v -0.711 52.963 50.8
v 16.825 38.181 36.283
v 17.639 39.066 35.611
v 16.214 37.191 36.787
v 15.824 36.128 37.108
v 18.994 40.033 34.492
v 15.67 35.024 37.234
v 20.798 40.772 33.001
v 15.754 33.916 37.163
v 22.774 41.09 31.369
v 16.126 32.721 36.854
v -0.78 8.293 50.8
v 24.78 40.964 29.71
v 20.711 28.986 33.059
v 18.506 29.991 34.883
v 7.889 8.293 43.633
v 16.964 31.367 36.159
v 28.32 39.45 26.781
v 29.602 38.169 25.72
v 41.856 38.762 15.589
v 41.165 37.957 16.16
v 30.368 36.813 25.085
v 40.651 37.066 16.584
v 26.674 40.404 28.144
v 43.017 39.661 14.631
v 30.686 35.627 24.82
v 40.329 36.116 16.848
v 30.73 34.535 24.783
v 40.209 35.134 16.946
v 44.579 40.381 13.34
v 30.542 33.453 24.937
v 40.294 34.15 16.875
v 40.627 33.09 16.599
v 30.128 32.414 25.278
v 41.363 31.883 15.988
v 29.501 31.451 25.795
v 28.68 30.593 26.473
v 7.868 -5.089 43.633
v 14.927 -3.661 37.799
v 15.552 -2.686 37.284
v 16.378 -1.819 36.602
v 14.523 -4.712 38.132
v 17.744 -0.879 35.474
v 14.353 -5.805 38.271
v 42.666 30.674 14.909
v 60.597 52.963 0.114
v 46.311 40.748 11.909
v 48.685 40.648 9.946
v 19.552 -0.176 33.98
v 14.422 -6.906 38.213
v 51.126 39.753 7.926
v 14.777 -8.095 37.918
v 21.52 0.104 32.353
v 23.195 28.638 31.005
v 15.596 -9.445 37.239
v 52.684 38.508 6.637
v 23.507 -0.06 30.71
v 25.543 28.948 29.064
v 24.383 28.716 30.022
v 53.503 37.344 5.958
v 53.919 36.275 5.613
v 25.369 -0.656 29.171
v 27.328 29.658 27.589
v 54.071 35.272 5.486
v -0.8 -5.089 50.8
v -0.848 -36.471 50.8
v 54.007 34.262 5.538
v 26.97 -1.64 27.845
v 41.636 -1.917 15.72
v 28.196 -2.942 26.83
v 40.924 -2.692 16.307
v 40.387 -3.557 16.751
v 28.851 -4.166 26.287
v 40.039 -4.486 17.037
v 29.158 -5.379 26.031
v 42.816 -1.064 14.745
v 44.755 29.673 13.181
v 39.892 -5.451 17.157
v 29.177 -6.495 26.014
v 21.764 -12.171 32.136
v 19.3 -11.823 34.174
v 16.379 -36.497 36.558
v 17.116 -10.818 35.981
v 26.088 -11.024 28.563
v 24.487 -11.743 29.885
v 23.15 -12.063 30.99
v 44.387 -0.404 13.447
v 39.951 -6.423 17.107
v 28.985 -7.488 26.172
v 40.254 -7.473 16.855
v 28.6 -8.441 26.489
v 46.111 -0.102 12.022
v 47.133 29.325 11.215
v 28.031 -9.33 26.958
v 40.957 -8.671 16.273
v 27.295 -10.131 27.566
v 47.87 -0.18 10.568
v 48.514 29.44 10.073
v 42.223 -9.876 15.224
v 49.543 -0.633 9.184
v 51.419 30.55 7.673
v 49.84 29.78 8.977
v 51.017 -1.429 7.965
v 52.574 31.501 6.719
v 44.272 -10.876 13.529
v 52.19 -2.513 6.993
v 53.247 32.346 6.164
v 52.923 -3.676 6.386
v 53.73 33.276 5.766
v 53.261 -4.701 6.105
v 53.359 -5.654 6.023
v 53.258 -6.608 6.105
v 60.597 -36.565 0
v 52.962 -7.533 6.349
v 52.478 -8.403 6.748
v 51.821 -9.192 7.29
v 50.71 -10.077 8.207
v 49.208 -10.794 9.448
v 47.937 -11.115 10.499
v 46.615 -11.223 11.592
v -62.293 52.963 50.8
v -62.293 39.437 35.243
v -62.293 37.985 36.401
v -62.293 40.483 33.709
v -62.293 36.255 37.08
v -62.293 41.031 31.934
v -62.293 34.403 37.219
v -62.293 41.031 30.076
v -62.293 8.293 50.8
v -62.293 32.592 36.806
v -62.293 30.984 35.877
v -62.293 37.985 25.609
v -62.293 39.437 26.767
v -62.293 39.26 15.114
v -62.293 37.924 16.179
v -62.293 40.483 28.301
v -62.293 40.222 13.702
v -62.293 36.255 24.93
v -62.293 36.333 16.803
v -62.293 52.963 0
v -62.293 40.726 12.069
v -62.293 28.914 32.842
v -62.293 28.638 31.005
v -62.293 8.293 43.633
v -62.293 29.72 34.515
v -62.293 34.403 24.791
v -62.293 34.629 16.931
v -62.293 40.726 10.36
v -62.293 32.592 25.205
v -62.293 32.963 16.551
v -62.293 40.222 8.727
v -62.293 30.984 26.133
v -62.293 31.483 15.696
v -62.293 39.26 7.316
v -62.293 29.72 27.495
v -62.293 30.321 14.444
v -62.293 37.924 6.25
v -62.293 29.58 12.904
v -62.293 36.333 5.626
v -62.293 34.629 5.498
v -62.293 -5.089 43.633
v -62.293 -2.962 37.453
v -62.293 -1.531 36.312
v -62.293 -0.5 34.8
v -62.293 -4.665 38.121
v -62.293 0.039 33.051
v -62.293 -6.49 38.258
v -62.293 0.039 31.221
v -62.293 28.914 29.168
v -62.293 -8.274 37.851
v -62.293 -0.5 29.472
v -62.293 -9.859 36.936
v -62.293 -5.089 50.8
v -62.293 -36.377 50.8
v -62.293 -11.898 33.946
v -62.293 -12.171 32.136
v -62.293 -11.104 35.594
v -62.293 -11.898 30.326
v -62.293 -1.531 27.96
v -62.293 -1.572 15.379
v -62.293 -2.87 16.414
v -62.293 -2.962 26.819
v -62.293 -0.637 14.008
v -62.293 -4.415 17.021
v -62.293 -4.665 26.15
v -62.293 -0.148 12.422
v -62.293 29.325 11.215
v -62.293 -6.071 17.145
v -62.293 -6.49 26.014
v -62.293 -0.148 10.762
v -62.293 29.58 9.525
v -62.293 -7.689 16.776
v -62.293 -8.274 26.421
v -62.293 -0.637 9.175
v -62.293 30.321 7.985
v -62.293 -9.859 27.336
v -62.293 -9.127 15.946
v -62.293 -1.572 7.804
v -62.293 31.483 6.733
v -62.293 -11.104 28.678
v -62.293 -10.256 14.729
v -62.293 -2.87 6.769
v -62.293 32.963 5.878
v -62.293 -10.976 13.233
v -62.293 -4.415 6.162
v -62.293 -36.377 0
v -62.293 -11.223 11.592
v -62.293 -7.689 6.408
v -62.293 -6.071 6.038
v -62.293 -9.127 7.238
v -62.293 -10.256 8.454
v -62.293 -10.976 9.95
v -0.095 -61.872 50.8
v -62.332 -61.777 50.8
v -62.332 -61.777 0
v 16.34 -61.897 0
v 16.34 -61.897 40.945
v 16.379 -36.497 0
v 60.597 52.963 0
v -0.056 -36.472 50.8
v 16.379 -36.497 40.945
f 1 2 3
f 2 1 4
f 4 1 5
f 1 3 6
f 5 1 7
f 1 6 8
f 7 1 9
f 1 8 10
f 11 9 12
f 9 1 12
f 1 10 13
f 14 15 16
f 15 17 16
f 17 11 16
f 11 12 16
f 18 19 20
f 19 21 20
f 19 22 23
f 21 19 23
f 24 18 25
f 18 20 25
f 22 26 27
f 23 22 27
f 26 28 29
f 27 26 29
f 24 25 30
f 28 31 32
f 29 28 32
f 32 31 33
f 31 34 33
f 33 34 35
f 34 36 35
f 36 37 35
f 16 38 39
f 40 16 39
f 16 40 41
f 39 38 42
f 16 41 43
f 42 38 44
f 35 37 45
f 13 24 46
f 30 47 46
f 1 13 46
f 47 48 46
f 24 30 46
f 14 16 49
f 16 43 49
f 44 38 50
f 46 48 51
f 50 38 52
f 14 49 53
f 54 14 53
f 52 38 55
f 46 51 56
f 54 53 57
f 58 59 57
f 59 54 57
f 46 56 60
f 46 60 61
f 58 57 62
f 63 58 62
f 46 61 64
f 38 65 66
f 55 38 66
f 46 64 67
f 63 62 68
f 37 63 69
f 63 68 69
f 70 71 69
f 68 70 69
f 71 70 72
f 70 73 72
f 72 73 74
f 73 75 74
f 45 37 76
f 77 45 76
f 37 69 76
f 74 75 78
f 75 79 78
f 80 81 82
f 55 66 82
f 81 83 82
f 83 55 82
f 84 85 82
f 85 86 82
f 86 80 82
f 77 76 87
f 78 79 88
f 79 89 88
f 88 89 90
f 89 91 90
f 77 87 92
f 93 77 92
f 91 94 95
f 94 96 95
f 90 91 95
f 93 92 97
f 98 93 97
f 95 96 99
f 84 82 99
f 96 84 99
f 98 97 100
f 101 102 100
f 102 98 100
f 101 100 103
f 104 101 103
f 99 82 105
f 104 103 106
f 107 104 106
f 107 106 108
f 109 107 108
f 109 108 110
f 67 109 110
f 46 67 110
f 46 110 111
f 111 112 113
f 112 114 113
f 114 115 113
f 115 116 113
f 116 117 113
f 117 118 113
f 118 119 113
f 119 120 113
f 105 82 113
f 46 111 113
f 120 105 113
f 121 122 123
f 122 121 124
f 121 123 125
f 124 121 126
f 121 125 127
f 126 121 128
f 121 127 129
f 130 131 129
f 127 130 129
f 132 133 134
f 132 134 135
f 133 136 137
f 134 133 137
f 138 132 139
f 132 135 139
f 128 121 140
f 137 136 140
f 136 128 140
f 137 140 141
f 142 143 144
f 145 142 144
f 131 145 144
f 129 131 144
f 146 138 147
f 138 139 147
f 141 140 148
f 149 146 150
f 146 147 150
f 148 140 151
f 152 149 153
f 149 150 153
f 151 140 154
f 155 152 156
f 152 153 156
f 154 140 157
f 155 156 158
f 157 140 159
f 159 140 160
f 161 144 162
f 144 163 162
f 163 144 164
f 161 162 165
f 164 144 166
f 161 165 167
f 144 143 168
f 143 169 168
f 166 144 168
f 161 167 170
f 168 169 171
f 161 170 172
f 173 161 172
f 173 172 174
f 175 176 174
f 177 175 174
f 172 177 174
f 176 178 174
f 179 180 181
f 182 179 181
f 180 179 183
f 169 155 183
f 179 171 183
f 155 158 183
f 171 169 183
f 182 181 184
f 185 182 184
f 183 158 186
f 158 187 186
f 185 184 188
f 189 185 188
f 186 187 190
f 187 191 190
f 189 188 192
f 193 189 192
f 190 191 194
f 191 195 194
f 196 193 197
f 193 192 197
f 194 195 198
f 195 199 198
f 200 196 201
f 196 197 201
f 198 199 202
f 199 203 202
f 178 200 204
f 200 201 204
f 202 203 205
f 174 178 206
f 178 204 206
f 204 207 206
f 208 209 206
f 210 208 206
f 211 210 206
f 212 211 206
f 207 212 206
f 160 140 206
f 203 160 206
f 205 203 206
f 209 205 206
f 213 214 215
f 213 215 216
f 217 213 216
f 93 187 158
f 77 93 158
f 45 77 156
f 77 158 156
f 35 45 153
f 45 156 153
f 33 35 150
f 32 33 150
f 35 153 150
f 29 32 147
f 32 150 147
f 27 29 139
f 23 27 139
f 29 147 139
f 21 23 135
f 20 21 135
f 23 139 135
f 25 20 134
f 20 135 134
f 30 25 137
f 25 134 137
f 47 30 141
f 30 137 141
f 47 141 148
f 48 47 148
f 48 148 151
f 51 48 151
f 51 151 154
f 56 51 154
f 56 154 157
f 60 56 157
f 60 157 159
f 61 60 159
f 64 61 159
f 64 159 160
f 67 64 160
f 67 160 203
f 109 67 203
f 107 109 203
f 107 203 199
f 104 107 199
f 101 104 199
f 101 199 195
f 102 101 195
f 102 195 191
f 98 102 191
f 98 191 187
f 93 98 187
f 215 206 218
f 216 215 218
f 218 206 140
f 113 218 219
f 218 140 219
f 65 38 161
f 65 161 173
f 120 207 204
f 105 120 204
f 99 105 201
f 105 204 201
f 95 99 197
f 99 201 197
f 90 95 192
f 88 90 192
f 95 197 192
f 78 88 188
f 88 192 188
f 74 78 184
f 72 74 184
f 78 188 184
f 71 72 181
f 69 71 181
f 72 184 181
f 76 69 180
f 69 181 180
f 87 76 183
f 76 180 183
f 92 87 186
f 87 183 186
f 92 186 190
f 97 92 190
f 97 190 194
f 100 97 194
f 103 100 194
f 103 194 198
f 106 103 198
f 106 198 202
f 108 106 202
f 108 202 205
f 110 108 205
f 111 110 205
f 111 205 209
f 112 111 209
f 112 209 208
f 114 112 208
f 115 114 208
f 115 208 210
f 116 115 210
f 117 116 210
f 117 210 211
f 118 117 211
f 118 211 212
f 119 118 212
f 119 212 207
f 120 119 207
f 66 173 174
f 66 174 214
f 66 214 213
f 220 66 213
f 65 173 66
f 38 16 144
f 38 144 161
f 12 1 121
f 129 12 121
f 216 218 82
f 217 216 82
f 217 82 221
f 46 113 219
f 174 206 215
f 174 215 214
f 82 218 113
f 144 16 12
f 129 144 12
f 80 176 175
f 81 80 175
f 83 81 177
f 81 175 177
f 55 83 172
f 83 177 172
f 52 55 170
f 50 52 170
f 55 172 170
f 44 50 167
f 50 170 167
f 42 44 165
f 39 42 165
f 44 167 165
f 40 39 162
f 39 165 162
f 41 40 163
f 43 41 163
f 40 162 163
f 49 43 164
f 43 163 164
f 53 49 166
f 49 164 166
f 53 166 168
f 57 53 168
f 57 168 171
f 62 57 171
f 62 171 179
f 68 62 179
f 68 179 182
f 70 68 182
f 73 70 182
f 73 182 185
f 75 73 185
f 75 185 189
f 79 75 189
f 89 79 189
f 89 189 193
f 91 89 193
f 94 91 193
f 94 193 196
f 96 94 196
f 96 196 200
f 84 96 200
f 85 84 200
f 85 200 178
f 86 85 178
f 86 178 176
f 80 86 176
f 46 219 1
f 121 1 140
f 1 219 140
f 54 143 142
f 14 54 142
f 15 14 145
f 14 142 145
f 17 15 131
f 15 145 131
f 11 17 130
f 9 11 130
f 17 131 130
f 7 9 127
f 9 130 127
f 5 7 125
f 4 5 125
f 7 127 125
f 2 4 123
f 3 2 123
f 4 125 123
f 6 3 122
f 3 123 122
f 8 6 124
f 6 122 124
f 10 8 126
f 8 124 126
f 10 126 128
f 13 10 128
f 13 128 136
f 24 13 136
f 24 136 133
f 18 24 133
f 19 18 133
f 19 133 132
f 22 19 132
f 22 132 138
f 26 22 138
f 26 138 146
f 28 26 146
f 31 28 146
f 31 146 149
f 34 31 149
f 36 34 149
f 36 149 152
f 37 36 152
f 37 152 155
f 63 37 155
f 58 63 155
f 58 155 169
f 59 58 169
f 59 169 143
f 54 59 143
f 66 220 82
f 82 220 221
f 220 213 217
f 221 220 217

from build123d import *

# Parameters (mm, degrees)
F1_DEPTH  = 50.8
F3_DEPTH  = 0.189480841
F4_DEPTH  = 89.7186418795
F5_W      = 13.382118661
F5_H      = 7.166751343
F6_DEPTH  = 122.8903324733
F7_W      = 78.6715284359
F7_H      = 50.8
F8_DEPTH  = 25.4
F10_DEPTH = 25.4
F11_R     = 6.2312707334
F12_DEPTH = 122.8903324733
F13_R     = 6.1393781486
F14_DEPTH = 122.8903324733
F15_R     = 5.7324119576
F16_DEPTH = 122.8903324733
F17_R     = 5.5689542342
F18_DEPTH = 122.8903324733


with BuildPart() as f1:
    # F0 (on Top) → F1 (new body)
    with BuildSketch(Plane.XY):
        Polygon((-62.2928291559, 52.9630370438), (-62.2928291559, -36.376748234), (60.5965033174, -36.5652292967), (60.5965033174, 52.9630370438), align=None)
    extrude(amount=F1_DEPTH)

    # F2 (on face) → F3 (join, through all)
    with BuildSketch(Plane(origin=(-0.0559391088, -36.4722038357, 0), x_dir=(0.9999988238, -0.0015337445, 0), z_dir=(-0.0015337445, -0.9999988238, 0))):
        Polygon((60.6525137648, 50.8), (-0.7922247423, 50.8), (60.6525137648, 0), align=None)
    extrude(amount=F3_DEPTH)

    # F4 (cut, through all): a face of the model
    f4_faces = [f1.faces().sort_by_distance(p)[0] for p in [
        (40.1146572899, -36.7232964043, 33.8666666667),
    ]]
    extrude(f4_faces, amount=-F4_DEPTH, mode=Mode.SUBTRACT)

    # F5 (on face) → F6 (cut, through all)
    with BuildSketch(Plane(origin=(-62.2928291559, 0, 0), x_dir=(0, -1, 0), z_dir=(-1, 0, 0))):
        with Locations((-1.6020850744, 47.2166243285)):
            Rectangle(F5_W, F5_H)
    extrude(amount=-F6_DEPTH, mode=Mode.SUBTRACT)

    # F7 (on face) → F8 (join)
    with BuildSketch(Plane(origin=(-0.0559391088, -36.4722038357, 0), x_dir=(0.9999988238, -0.0015337445, 0), z_dir=(-0.0015337445, -0.9999988238, 0))):
        with Locations((-22.9011990315, 25.4)):
            Rectangle(F7_W, F7_H)
    extrude(amount=F8_DEPTH)

    # F9 (on face) → F10 (cut)
    with BuildSketch(Plane(origin=(-0.0948962197, -61.8721739606, 0), x_dir=(0.9999988238, -0.0015337445, 0), z_dir=(-0.0015337445, -0.9999988238, 0))):
        Polygon((16.4345651865, 50.8), (0, 50.8), (16.4345651865, 40.9449264407), align=None)
    extrude(amount=-F10_DEPTH, mode=Mode.SUBTRACT)

    # F11 (on face) → F12 (cut, through all)
    with BuildSketch(Plane(origin=(-62.2928291559, 0, 0), x_dir=(0, -1, 0), z_dir=(-1, 0, 0))):
        with Locations((-34.8689034581, 31.0050528497)):
            Circle(F11_R)
    extrude(amount=-F12_DEPTH, mode=Mode.SUBTRACT)

    # F13 (on face) → F14 (cut, through all)
    with BuildSketch(Plane(origin=(-62.2928291559, 0, 0), x_dir=(0, -1, 0), z_dir=(-1, 0, 0))):
        with Locations((6.031378638, 32.1359373629)):
            Circle(F13_R)
    extrude(amount=-F14_DEPTH, mode=Mode.SUBTRACT)

    # F15 (on face) → F16 (cut, through all)
    with BuildSketch(Plane(origin=(-62.2928291559, 0, 0), x_dir=(0, -1, 0), z_dir=(-1, 0, 0))):
        with Locations((-35.0573845208, 11.2145934254)):
            Circle(F15_R)
    extrude(amount=-F16_DEPTH, mode=Mode.SUBTRACT)

    # F17 (on face) → F18 (cut, through all)
    with BuildSketch(Plane(origin=(-62.2928291559, 0, 0), x_dir=(0, -1, 0), z_dir=(-1, 0, 0))):
        with Locations((5.6544179097, 11.5915555507)):
            Circle(F17_R)
    extrude(amount=-F18_DEPTH, mode=Mode.SUBTRACT)


solid = f1.part
